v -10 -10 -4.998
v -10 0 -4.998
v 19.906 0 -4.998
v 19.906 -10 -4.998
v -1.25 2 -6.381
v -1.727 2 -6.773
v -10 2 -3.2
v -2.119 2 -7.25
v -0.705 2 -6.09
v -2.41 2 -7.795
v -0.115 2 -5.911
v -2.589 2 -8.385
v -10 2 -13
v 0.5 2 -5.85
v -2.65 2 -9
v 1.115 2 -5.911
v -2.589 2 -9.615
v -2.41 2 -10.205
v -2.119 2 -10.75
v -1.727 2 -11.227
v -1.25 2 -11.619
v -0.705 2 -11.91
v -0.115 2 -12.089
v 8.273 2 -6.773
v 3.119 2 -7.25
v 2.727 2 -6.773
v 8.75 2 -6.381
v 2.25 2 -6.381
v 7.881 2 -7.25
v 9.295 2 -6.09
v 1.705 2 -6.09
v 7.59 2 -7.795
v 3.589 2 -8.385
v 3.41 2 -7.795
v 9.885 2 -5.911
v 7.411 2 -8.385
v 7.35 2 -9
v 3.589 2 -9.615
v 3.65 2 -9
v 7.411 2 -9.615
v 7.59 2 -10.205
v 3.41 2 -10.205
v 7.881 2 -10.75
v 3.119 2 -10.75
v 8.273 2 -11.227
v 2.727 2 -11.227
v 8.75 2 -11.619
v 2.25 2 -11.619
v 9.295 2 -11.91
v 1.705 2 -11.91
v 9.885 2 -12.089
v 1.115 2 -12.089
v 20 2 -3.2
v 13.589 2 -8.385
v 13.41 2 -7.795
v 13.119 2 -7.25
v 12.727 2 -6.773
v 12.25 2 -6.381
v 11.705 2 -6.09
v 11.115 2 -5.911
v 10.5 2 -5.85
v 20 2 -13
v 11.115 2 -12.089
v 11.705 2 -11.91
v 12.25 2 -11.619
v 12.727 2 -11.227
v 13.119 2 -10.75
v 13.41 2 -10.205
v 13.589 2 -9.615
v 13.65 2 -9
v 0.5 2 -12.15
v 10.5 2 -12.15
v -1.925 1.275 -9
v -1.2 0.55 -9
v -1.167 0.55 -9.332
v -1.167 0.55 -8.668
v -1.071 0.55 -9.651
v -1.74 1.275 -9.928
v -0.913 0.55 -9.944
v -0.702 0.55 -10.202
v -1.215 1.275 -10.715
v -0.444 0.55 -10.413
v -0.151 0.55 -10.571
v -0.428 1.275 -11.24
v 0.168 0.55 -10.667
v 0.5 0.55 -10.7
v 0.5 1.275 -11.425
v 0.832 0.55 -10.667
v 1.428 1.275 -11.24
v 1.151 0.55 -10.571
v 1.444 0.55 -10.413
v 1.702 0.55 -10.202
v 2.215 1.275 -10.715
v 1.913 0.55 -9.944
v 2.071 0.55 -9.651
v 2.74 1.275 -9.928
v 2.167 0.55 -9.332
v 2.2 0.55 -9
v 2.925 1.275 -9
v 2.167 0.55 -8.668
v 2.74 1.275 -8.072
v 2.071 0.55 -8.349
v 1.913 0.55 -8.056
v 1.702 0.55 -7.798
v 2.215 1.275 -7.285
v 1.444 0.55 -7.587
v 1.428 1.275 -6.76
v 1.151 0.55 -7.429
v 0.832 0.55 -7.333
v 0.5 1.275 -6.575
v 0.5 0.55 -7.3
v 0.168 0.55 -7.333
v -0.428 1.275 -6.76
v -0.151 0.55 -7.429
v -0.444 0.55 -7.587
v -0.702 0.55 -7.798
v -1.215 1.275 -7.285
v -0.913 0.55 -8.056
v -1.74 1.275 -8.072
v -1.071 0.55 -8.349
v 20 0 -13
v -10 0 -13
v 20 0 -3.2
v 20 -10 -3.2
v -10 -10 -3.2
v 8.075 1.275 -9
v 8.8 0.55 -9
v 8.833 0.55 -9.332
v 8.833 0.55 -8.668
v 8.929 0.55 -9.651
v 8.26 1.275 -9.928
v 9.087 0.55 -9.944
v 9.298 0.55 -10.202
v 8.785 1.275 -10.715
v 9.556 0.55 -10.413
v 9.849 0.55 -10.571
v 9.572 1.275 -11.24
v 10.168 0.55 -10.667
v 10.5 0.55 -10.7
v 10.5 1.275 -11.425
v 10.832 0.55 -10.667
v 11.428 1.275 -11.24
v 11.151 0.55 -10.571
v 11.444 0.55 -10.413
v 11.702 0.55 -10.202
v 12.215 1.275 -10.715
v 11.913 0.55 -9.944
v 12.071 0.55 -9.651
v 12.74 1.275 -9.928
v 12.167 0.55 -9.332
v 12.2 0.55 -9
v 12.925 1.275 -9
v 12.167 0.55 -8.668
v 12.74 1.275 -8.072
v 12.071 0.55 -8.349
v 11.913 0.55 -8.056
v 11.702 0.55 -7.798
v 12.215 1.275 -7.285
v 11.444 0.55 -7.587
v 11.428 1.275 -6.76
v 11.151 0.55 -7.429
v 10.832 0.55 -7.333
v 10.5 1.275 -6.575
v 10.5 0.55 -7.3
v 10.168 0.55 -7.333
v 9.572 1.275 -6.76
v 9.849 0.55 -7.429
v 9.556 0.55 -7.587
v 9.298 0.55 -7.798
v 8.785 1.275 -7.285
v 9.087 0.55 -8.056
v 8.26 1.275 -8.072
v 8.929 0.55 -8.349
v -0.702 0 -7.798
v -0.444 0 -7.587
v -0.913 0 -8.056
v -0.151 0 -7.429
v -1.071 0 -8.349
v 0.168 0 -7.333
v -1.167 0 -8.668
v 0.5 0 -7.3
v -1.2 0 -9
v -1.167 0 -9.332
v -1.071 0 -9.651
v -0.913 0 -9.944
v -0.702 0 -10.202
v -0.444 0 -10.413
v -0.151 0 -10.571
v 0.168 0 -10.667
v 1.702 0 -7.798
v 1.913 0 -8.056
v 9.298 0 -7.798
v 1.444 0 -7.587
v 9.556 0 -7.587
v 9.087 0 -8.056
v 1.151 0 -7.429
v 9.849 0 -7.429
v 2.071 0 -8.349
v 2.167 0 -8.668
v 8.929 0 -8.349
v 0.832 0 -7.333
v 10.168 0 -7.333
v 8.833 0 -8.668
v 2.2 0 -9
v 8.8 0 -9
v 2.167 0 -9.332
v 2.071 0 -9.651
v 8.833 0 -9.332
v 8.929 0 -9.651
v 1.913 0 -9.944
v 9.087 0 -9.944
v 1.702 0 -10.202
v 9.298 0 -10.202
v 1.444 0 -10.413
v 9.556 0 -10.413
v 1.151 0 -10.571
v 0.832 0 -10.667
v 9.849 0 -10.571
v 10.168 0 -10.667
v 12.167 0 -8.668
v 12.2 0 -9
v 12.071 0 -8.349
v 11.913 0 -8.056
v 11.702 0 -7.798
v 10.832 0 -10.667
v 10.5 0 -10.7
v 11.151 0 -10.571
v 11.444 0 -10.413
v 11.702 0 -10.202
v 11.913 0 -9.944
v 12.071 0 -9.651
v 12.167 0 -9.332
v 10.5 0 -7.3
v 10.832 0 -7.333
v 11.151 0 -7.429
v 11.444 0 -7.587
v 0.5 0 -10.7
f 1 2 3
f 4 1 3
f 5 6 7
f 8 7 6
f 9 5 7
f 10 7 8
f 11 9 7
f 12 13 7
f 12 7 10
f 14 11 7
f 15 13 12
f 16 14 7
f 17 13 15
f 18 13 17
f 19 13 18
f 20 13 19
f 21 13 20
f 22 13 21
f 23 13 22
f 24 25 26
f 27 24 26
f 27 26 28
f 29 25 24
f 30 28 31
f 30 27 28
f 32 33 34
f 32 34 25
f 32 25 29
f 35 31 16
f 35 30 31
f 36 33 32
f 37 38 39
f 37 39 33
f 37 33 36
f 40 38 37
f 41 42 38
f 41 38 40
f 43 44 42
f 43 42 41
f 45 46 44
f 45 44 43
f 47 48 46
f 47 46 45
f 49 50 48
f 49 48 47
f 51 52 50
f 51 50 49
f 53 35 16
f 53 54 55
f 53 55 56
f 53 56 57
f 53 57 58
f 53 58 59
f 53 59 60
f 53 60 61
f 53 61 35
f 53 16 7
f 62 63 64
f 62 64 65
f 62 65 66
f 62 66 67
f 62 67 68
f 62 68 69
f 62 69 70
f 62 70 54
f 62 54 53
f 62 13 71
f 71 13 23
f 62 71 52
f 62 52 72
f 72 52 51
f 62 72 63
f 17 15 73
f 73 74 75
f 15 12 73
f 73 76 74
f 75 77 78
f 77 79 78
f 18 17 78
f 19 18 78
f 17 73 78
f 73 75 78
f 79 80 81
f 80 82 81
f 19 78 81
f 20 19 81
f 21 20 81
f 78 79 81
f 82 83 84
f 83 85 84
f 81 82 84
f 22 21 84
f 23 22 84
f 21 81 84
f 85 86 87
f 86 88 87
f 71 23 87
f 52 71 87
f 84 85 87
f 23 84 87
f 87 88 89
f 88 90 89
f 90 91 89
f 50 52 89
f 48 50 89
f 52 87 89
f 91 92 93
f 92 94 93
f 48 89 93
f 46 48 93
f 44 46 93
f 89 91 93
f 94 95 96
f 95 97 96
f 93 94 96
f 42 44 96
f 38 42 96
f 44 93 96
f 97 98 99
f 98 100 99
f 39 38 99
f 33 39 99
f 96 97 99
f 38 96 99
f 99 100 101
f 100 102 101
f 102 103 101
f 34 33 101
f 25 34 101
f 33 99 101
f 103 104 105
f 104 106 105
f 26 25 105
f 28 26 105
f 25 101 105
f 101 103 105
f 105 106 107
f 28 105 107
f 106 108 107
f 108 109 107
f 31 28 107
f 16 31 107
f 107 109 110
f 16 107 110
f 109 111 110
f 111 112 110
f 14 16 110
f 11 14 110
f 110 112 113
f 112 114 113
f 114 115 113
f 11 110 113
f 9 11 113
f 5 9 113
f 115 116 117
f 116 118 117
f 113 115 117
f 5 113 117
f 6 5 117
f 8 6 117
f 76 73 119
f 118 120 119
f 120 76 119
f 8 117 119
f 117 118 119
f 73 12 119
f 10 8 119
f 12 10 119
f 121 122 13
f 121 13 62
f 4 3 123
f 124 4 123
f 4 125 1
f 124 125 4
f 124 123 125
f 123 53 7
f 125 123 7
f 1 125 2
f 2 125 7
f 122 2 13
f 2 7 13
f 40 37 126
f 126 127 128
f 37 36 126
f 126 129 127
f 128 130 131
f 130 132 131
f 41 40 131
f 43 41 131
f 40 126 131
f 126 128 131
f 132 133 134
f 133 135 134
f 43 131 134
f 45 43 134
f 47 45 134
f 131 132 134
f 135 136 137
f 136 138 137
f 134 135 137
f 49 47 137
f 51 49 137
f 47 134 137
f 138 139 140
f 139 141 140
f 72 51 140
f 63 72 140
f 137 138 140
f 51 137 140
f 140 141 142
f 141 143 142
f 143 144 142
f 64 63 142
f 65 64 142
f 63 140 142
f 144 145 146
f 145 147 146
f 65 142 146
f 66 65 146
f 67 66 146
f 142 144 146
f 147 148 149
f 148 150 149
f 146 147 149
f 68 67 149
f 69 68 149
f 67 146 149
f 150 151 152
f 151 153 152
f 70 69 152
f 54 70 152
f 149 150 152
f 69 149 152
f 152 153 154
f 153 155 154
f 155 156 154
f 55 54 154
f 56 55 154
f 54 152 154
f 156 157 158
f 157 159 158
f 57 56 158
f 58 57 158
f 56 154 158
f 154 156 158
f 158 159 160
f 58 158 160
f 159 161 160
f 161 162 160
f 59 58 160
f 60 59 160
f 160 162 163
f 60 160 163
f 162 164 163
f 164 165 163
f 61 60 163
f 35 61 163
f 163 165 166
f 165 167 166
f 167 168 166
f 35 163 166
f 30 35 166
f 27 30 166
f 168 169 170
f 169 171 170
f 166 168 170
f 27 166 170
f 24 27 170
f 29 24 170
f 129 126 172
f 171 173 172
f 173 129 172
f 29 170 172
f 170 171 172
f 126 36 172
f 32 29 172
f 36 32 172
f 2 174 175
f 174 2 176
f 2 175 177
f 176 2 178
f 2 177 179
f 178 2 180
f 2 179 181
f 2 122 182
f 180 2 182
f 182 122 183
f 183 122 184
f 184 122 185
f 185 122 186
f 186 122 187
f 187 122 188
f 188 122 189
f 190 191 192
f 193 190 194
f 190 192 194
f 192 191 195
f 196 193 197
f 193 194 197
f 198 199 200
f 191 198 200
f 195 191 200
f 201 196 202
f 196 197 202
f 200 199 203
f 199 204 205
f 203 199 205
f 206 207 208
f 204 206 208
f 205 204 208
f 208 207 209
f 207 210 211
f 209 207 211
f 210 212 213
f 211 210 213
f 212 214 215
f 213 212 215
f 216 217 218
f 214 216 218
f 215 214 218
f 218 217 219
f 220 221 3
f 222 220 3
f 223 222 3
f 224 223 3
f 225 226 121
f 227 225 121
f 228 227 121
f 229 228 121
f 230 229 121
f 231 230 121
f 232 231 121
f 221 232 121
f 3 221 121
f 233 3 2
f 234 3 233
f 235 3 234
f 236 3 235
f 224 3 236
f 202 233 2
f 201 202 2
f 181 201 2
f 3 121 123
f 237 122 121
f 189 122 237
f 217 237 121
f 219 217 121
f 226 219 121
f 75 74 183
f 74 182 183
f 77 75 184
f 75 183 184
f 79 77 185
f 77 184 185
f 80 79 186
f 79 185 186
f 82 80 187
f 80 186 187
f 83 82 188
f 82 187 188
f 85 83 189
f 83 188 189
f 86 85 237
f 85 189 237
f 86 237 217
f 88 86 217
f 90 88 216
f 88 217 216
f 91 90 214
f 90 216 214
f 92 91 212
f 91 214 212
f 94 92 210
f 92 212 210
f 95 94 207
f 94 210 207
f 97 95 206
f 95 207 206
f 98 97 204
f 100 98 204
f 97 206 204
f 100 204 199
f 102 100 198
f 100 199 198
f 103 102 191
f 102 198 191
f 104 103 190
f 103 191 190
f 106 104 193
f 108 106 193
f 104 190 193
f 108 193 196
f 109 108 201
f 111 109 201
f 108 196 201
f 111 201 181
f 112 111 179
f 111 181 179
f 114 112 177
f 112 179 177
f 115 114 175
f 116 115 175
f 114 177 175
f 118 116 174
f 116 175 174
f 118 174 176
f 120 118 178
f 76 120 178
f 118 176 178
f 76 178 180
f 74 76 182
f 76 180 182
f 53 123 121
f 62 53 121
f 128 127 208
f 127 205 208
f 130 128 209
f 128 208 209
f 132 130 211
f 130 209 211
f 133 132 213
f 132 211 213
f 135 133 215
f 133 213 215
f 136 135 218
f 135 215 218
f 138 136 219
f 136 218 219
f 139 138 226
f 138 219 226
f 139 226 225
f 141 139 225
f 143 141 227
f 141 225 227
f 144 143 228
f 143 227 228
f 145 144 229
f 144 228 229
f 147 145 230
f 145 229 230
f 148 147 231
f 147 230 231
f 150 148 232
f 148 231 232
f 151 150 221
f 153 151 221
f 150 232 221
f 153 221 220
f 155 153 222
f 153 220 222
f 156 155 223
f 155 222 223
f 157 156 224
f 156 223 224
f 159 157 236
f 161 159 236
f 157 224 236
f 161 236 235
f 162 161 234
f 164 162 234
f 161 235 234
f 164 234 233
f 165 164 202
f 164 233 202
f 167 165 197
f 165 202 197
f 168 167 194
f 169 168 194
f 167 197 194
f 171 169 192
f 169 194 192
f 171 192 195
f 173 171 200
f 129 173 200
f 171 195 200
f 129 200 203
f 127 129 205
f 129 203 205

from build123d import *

# Parameters (mm, degrees)
SKIZZE1_W                                            = 30
SKIZZE1_H                                            = 9.8
AUFSATZ_LINEAR_AUSTRAGEN1_DEPTH                      = 2
FORMSENKUNG_F_R_M3_LINSENSENKSCHRAUBE_MI_D           = 3.4
FORMSENKUNG_F_R_M3_LINSENSENKSCHRAUBE_MI_DEPTH       = 8.5
FORMSENKUNG_F_R_M3_LINSENSENKSCHRAUBE_MI_CSINK_D     = 6.3
FORMSENKUNG_F_R_M3_LINSENSENKSCHRAUBE_MI_CSINK_ANGLE = 90
FORMSENKUNG_F_R_M3_LINSENSENKSCHRAUBE_MI_TIP         = 1.021463052
AUFSATZ_LINEAR_AUSTRAGEN2_DEPTH                      = 10


with BuildPart() as part:
    # Skizze1 → Aufsatz-Linear austragen1 (new body)
    with BuildSketch(Plane(origin=(0, 0, 0), x_dir=(1, 0, 0), z_dir=(0, 1, 0))):
        with Locations((5, 8.1)):
            Rectangle(SKIZZE1_W, SKIZZE1_H)
    extrude(amount=AUFSATZ_LINEAR_AUSTRAGEN1_DEPTH)

    # Formsenkung für M3 Linsensenkschraube mit Schlitz1
    with Locations(Plane(origin=(0, 2, 0), x_dir=(1, 0, 0), z_dir=(0, 1, 0))):
        with Locations((0.5, 9), (10.5, 9)):
            CounterSinkHole(FORMSENKUNG_F_R_M3_LINSENSENKSCHRAUBE_MI_D / 2, FORMSENKUNG_F_R_M3_LINSENSENKSCHRAUBE_MI_CSINK_D / 2, depth=FORMSENKUNG_F_R_M3_LINSENSENKSCHRAUBE_MI_DEPTH, counter_sink_angle=FORMSENKUNG_F_R_M3_LINSENSENKSCHRAUBE_MI_CSINK_ANGLE)
            with Locations((0, 0, -(FORMSENKUNG_F_R_M3_LINSENSENKSCHRAUBE_MI_DEPTH + FORMSENKUNG_F_R_M3_LINSENSENKSCHRAUBE_MI_TIP / 2))):  # 118° drill point
                Cone(0, FORMSENKUNG_F_R_M3_LINSENSENKSCHRAUBE_MI_D / 2, FORMSENKUNG_F_R_M3_LINSENSENKSCHRAUBE_MI_TIP, mode=Mode.SUBTRACT)

    # Skizze13 → Aufsatz-Linear austragen2 (add)
    with BuildSketch(Plane.XZ):
        Polygon((-10, -3.2), (-10, -4.99756301), (19.906366545, -4.99756301), (20, -3.2), align=None)
    extrude(amount=AUFSATZ_LINEAR_AUSTRAGEN2_DEPTH)


solid = part.part
